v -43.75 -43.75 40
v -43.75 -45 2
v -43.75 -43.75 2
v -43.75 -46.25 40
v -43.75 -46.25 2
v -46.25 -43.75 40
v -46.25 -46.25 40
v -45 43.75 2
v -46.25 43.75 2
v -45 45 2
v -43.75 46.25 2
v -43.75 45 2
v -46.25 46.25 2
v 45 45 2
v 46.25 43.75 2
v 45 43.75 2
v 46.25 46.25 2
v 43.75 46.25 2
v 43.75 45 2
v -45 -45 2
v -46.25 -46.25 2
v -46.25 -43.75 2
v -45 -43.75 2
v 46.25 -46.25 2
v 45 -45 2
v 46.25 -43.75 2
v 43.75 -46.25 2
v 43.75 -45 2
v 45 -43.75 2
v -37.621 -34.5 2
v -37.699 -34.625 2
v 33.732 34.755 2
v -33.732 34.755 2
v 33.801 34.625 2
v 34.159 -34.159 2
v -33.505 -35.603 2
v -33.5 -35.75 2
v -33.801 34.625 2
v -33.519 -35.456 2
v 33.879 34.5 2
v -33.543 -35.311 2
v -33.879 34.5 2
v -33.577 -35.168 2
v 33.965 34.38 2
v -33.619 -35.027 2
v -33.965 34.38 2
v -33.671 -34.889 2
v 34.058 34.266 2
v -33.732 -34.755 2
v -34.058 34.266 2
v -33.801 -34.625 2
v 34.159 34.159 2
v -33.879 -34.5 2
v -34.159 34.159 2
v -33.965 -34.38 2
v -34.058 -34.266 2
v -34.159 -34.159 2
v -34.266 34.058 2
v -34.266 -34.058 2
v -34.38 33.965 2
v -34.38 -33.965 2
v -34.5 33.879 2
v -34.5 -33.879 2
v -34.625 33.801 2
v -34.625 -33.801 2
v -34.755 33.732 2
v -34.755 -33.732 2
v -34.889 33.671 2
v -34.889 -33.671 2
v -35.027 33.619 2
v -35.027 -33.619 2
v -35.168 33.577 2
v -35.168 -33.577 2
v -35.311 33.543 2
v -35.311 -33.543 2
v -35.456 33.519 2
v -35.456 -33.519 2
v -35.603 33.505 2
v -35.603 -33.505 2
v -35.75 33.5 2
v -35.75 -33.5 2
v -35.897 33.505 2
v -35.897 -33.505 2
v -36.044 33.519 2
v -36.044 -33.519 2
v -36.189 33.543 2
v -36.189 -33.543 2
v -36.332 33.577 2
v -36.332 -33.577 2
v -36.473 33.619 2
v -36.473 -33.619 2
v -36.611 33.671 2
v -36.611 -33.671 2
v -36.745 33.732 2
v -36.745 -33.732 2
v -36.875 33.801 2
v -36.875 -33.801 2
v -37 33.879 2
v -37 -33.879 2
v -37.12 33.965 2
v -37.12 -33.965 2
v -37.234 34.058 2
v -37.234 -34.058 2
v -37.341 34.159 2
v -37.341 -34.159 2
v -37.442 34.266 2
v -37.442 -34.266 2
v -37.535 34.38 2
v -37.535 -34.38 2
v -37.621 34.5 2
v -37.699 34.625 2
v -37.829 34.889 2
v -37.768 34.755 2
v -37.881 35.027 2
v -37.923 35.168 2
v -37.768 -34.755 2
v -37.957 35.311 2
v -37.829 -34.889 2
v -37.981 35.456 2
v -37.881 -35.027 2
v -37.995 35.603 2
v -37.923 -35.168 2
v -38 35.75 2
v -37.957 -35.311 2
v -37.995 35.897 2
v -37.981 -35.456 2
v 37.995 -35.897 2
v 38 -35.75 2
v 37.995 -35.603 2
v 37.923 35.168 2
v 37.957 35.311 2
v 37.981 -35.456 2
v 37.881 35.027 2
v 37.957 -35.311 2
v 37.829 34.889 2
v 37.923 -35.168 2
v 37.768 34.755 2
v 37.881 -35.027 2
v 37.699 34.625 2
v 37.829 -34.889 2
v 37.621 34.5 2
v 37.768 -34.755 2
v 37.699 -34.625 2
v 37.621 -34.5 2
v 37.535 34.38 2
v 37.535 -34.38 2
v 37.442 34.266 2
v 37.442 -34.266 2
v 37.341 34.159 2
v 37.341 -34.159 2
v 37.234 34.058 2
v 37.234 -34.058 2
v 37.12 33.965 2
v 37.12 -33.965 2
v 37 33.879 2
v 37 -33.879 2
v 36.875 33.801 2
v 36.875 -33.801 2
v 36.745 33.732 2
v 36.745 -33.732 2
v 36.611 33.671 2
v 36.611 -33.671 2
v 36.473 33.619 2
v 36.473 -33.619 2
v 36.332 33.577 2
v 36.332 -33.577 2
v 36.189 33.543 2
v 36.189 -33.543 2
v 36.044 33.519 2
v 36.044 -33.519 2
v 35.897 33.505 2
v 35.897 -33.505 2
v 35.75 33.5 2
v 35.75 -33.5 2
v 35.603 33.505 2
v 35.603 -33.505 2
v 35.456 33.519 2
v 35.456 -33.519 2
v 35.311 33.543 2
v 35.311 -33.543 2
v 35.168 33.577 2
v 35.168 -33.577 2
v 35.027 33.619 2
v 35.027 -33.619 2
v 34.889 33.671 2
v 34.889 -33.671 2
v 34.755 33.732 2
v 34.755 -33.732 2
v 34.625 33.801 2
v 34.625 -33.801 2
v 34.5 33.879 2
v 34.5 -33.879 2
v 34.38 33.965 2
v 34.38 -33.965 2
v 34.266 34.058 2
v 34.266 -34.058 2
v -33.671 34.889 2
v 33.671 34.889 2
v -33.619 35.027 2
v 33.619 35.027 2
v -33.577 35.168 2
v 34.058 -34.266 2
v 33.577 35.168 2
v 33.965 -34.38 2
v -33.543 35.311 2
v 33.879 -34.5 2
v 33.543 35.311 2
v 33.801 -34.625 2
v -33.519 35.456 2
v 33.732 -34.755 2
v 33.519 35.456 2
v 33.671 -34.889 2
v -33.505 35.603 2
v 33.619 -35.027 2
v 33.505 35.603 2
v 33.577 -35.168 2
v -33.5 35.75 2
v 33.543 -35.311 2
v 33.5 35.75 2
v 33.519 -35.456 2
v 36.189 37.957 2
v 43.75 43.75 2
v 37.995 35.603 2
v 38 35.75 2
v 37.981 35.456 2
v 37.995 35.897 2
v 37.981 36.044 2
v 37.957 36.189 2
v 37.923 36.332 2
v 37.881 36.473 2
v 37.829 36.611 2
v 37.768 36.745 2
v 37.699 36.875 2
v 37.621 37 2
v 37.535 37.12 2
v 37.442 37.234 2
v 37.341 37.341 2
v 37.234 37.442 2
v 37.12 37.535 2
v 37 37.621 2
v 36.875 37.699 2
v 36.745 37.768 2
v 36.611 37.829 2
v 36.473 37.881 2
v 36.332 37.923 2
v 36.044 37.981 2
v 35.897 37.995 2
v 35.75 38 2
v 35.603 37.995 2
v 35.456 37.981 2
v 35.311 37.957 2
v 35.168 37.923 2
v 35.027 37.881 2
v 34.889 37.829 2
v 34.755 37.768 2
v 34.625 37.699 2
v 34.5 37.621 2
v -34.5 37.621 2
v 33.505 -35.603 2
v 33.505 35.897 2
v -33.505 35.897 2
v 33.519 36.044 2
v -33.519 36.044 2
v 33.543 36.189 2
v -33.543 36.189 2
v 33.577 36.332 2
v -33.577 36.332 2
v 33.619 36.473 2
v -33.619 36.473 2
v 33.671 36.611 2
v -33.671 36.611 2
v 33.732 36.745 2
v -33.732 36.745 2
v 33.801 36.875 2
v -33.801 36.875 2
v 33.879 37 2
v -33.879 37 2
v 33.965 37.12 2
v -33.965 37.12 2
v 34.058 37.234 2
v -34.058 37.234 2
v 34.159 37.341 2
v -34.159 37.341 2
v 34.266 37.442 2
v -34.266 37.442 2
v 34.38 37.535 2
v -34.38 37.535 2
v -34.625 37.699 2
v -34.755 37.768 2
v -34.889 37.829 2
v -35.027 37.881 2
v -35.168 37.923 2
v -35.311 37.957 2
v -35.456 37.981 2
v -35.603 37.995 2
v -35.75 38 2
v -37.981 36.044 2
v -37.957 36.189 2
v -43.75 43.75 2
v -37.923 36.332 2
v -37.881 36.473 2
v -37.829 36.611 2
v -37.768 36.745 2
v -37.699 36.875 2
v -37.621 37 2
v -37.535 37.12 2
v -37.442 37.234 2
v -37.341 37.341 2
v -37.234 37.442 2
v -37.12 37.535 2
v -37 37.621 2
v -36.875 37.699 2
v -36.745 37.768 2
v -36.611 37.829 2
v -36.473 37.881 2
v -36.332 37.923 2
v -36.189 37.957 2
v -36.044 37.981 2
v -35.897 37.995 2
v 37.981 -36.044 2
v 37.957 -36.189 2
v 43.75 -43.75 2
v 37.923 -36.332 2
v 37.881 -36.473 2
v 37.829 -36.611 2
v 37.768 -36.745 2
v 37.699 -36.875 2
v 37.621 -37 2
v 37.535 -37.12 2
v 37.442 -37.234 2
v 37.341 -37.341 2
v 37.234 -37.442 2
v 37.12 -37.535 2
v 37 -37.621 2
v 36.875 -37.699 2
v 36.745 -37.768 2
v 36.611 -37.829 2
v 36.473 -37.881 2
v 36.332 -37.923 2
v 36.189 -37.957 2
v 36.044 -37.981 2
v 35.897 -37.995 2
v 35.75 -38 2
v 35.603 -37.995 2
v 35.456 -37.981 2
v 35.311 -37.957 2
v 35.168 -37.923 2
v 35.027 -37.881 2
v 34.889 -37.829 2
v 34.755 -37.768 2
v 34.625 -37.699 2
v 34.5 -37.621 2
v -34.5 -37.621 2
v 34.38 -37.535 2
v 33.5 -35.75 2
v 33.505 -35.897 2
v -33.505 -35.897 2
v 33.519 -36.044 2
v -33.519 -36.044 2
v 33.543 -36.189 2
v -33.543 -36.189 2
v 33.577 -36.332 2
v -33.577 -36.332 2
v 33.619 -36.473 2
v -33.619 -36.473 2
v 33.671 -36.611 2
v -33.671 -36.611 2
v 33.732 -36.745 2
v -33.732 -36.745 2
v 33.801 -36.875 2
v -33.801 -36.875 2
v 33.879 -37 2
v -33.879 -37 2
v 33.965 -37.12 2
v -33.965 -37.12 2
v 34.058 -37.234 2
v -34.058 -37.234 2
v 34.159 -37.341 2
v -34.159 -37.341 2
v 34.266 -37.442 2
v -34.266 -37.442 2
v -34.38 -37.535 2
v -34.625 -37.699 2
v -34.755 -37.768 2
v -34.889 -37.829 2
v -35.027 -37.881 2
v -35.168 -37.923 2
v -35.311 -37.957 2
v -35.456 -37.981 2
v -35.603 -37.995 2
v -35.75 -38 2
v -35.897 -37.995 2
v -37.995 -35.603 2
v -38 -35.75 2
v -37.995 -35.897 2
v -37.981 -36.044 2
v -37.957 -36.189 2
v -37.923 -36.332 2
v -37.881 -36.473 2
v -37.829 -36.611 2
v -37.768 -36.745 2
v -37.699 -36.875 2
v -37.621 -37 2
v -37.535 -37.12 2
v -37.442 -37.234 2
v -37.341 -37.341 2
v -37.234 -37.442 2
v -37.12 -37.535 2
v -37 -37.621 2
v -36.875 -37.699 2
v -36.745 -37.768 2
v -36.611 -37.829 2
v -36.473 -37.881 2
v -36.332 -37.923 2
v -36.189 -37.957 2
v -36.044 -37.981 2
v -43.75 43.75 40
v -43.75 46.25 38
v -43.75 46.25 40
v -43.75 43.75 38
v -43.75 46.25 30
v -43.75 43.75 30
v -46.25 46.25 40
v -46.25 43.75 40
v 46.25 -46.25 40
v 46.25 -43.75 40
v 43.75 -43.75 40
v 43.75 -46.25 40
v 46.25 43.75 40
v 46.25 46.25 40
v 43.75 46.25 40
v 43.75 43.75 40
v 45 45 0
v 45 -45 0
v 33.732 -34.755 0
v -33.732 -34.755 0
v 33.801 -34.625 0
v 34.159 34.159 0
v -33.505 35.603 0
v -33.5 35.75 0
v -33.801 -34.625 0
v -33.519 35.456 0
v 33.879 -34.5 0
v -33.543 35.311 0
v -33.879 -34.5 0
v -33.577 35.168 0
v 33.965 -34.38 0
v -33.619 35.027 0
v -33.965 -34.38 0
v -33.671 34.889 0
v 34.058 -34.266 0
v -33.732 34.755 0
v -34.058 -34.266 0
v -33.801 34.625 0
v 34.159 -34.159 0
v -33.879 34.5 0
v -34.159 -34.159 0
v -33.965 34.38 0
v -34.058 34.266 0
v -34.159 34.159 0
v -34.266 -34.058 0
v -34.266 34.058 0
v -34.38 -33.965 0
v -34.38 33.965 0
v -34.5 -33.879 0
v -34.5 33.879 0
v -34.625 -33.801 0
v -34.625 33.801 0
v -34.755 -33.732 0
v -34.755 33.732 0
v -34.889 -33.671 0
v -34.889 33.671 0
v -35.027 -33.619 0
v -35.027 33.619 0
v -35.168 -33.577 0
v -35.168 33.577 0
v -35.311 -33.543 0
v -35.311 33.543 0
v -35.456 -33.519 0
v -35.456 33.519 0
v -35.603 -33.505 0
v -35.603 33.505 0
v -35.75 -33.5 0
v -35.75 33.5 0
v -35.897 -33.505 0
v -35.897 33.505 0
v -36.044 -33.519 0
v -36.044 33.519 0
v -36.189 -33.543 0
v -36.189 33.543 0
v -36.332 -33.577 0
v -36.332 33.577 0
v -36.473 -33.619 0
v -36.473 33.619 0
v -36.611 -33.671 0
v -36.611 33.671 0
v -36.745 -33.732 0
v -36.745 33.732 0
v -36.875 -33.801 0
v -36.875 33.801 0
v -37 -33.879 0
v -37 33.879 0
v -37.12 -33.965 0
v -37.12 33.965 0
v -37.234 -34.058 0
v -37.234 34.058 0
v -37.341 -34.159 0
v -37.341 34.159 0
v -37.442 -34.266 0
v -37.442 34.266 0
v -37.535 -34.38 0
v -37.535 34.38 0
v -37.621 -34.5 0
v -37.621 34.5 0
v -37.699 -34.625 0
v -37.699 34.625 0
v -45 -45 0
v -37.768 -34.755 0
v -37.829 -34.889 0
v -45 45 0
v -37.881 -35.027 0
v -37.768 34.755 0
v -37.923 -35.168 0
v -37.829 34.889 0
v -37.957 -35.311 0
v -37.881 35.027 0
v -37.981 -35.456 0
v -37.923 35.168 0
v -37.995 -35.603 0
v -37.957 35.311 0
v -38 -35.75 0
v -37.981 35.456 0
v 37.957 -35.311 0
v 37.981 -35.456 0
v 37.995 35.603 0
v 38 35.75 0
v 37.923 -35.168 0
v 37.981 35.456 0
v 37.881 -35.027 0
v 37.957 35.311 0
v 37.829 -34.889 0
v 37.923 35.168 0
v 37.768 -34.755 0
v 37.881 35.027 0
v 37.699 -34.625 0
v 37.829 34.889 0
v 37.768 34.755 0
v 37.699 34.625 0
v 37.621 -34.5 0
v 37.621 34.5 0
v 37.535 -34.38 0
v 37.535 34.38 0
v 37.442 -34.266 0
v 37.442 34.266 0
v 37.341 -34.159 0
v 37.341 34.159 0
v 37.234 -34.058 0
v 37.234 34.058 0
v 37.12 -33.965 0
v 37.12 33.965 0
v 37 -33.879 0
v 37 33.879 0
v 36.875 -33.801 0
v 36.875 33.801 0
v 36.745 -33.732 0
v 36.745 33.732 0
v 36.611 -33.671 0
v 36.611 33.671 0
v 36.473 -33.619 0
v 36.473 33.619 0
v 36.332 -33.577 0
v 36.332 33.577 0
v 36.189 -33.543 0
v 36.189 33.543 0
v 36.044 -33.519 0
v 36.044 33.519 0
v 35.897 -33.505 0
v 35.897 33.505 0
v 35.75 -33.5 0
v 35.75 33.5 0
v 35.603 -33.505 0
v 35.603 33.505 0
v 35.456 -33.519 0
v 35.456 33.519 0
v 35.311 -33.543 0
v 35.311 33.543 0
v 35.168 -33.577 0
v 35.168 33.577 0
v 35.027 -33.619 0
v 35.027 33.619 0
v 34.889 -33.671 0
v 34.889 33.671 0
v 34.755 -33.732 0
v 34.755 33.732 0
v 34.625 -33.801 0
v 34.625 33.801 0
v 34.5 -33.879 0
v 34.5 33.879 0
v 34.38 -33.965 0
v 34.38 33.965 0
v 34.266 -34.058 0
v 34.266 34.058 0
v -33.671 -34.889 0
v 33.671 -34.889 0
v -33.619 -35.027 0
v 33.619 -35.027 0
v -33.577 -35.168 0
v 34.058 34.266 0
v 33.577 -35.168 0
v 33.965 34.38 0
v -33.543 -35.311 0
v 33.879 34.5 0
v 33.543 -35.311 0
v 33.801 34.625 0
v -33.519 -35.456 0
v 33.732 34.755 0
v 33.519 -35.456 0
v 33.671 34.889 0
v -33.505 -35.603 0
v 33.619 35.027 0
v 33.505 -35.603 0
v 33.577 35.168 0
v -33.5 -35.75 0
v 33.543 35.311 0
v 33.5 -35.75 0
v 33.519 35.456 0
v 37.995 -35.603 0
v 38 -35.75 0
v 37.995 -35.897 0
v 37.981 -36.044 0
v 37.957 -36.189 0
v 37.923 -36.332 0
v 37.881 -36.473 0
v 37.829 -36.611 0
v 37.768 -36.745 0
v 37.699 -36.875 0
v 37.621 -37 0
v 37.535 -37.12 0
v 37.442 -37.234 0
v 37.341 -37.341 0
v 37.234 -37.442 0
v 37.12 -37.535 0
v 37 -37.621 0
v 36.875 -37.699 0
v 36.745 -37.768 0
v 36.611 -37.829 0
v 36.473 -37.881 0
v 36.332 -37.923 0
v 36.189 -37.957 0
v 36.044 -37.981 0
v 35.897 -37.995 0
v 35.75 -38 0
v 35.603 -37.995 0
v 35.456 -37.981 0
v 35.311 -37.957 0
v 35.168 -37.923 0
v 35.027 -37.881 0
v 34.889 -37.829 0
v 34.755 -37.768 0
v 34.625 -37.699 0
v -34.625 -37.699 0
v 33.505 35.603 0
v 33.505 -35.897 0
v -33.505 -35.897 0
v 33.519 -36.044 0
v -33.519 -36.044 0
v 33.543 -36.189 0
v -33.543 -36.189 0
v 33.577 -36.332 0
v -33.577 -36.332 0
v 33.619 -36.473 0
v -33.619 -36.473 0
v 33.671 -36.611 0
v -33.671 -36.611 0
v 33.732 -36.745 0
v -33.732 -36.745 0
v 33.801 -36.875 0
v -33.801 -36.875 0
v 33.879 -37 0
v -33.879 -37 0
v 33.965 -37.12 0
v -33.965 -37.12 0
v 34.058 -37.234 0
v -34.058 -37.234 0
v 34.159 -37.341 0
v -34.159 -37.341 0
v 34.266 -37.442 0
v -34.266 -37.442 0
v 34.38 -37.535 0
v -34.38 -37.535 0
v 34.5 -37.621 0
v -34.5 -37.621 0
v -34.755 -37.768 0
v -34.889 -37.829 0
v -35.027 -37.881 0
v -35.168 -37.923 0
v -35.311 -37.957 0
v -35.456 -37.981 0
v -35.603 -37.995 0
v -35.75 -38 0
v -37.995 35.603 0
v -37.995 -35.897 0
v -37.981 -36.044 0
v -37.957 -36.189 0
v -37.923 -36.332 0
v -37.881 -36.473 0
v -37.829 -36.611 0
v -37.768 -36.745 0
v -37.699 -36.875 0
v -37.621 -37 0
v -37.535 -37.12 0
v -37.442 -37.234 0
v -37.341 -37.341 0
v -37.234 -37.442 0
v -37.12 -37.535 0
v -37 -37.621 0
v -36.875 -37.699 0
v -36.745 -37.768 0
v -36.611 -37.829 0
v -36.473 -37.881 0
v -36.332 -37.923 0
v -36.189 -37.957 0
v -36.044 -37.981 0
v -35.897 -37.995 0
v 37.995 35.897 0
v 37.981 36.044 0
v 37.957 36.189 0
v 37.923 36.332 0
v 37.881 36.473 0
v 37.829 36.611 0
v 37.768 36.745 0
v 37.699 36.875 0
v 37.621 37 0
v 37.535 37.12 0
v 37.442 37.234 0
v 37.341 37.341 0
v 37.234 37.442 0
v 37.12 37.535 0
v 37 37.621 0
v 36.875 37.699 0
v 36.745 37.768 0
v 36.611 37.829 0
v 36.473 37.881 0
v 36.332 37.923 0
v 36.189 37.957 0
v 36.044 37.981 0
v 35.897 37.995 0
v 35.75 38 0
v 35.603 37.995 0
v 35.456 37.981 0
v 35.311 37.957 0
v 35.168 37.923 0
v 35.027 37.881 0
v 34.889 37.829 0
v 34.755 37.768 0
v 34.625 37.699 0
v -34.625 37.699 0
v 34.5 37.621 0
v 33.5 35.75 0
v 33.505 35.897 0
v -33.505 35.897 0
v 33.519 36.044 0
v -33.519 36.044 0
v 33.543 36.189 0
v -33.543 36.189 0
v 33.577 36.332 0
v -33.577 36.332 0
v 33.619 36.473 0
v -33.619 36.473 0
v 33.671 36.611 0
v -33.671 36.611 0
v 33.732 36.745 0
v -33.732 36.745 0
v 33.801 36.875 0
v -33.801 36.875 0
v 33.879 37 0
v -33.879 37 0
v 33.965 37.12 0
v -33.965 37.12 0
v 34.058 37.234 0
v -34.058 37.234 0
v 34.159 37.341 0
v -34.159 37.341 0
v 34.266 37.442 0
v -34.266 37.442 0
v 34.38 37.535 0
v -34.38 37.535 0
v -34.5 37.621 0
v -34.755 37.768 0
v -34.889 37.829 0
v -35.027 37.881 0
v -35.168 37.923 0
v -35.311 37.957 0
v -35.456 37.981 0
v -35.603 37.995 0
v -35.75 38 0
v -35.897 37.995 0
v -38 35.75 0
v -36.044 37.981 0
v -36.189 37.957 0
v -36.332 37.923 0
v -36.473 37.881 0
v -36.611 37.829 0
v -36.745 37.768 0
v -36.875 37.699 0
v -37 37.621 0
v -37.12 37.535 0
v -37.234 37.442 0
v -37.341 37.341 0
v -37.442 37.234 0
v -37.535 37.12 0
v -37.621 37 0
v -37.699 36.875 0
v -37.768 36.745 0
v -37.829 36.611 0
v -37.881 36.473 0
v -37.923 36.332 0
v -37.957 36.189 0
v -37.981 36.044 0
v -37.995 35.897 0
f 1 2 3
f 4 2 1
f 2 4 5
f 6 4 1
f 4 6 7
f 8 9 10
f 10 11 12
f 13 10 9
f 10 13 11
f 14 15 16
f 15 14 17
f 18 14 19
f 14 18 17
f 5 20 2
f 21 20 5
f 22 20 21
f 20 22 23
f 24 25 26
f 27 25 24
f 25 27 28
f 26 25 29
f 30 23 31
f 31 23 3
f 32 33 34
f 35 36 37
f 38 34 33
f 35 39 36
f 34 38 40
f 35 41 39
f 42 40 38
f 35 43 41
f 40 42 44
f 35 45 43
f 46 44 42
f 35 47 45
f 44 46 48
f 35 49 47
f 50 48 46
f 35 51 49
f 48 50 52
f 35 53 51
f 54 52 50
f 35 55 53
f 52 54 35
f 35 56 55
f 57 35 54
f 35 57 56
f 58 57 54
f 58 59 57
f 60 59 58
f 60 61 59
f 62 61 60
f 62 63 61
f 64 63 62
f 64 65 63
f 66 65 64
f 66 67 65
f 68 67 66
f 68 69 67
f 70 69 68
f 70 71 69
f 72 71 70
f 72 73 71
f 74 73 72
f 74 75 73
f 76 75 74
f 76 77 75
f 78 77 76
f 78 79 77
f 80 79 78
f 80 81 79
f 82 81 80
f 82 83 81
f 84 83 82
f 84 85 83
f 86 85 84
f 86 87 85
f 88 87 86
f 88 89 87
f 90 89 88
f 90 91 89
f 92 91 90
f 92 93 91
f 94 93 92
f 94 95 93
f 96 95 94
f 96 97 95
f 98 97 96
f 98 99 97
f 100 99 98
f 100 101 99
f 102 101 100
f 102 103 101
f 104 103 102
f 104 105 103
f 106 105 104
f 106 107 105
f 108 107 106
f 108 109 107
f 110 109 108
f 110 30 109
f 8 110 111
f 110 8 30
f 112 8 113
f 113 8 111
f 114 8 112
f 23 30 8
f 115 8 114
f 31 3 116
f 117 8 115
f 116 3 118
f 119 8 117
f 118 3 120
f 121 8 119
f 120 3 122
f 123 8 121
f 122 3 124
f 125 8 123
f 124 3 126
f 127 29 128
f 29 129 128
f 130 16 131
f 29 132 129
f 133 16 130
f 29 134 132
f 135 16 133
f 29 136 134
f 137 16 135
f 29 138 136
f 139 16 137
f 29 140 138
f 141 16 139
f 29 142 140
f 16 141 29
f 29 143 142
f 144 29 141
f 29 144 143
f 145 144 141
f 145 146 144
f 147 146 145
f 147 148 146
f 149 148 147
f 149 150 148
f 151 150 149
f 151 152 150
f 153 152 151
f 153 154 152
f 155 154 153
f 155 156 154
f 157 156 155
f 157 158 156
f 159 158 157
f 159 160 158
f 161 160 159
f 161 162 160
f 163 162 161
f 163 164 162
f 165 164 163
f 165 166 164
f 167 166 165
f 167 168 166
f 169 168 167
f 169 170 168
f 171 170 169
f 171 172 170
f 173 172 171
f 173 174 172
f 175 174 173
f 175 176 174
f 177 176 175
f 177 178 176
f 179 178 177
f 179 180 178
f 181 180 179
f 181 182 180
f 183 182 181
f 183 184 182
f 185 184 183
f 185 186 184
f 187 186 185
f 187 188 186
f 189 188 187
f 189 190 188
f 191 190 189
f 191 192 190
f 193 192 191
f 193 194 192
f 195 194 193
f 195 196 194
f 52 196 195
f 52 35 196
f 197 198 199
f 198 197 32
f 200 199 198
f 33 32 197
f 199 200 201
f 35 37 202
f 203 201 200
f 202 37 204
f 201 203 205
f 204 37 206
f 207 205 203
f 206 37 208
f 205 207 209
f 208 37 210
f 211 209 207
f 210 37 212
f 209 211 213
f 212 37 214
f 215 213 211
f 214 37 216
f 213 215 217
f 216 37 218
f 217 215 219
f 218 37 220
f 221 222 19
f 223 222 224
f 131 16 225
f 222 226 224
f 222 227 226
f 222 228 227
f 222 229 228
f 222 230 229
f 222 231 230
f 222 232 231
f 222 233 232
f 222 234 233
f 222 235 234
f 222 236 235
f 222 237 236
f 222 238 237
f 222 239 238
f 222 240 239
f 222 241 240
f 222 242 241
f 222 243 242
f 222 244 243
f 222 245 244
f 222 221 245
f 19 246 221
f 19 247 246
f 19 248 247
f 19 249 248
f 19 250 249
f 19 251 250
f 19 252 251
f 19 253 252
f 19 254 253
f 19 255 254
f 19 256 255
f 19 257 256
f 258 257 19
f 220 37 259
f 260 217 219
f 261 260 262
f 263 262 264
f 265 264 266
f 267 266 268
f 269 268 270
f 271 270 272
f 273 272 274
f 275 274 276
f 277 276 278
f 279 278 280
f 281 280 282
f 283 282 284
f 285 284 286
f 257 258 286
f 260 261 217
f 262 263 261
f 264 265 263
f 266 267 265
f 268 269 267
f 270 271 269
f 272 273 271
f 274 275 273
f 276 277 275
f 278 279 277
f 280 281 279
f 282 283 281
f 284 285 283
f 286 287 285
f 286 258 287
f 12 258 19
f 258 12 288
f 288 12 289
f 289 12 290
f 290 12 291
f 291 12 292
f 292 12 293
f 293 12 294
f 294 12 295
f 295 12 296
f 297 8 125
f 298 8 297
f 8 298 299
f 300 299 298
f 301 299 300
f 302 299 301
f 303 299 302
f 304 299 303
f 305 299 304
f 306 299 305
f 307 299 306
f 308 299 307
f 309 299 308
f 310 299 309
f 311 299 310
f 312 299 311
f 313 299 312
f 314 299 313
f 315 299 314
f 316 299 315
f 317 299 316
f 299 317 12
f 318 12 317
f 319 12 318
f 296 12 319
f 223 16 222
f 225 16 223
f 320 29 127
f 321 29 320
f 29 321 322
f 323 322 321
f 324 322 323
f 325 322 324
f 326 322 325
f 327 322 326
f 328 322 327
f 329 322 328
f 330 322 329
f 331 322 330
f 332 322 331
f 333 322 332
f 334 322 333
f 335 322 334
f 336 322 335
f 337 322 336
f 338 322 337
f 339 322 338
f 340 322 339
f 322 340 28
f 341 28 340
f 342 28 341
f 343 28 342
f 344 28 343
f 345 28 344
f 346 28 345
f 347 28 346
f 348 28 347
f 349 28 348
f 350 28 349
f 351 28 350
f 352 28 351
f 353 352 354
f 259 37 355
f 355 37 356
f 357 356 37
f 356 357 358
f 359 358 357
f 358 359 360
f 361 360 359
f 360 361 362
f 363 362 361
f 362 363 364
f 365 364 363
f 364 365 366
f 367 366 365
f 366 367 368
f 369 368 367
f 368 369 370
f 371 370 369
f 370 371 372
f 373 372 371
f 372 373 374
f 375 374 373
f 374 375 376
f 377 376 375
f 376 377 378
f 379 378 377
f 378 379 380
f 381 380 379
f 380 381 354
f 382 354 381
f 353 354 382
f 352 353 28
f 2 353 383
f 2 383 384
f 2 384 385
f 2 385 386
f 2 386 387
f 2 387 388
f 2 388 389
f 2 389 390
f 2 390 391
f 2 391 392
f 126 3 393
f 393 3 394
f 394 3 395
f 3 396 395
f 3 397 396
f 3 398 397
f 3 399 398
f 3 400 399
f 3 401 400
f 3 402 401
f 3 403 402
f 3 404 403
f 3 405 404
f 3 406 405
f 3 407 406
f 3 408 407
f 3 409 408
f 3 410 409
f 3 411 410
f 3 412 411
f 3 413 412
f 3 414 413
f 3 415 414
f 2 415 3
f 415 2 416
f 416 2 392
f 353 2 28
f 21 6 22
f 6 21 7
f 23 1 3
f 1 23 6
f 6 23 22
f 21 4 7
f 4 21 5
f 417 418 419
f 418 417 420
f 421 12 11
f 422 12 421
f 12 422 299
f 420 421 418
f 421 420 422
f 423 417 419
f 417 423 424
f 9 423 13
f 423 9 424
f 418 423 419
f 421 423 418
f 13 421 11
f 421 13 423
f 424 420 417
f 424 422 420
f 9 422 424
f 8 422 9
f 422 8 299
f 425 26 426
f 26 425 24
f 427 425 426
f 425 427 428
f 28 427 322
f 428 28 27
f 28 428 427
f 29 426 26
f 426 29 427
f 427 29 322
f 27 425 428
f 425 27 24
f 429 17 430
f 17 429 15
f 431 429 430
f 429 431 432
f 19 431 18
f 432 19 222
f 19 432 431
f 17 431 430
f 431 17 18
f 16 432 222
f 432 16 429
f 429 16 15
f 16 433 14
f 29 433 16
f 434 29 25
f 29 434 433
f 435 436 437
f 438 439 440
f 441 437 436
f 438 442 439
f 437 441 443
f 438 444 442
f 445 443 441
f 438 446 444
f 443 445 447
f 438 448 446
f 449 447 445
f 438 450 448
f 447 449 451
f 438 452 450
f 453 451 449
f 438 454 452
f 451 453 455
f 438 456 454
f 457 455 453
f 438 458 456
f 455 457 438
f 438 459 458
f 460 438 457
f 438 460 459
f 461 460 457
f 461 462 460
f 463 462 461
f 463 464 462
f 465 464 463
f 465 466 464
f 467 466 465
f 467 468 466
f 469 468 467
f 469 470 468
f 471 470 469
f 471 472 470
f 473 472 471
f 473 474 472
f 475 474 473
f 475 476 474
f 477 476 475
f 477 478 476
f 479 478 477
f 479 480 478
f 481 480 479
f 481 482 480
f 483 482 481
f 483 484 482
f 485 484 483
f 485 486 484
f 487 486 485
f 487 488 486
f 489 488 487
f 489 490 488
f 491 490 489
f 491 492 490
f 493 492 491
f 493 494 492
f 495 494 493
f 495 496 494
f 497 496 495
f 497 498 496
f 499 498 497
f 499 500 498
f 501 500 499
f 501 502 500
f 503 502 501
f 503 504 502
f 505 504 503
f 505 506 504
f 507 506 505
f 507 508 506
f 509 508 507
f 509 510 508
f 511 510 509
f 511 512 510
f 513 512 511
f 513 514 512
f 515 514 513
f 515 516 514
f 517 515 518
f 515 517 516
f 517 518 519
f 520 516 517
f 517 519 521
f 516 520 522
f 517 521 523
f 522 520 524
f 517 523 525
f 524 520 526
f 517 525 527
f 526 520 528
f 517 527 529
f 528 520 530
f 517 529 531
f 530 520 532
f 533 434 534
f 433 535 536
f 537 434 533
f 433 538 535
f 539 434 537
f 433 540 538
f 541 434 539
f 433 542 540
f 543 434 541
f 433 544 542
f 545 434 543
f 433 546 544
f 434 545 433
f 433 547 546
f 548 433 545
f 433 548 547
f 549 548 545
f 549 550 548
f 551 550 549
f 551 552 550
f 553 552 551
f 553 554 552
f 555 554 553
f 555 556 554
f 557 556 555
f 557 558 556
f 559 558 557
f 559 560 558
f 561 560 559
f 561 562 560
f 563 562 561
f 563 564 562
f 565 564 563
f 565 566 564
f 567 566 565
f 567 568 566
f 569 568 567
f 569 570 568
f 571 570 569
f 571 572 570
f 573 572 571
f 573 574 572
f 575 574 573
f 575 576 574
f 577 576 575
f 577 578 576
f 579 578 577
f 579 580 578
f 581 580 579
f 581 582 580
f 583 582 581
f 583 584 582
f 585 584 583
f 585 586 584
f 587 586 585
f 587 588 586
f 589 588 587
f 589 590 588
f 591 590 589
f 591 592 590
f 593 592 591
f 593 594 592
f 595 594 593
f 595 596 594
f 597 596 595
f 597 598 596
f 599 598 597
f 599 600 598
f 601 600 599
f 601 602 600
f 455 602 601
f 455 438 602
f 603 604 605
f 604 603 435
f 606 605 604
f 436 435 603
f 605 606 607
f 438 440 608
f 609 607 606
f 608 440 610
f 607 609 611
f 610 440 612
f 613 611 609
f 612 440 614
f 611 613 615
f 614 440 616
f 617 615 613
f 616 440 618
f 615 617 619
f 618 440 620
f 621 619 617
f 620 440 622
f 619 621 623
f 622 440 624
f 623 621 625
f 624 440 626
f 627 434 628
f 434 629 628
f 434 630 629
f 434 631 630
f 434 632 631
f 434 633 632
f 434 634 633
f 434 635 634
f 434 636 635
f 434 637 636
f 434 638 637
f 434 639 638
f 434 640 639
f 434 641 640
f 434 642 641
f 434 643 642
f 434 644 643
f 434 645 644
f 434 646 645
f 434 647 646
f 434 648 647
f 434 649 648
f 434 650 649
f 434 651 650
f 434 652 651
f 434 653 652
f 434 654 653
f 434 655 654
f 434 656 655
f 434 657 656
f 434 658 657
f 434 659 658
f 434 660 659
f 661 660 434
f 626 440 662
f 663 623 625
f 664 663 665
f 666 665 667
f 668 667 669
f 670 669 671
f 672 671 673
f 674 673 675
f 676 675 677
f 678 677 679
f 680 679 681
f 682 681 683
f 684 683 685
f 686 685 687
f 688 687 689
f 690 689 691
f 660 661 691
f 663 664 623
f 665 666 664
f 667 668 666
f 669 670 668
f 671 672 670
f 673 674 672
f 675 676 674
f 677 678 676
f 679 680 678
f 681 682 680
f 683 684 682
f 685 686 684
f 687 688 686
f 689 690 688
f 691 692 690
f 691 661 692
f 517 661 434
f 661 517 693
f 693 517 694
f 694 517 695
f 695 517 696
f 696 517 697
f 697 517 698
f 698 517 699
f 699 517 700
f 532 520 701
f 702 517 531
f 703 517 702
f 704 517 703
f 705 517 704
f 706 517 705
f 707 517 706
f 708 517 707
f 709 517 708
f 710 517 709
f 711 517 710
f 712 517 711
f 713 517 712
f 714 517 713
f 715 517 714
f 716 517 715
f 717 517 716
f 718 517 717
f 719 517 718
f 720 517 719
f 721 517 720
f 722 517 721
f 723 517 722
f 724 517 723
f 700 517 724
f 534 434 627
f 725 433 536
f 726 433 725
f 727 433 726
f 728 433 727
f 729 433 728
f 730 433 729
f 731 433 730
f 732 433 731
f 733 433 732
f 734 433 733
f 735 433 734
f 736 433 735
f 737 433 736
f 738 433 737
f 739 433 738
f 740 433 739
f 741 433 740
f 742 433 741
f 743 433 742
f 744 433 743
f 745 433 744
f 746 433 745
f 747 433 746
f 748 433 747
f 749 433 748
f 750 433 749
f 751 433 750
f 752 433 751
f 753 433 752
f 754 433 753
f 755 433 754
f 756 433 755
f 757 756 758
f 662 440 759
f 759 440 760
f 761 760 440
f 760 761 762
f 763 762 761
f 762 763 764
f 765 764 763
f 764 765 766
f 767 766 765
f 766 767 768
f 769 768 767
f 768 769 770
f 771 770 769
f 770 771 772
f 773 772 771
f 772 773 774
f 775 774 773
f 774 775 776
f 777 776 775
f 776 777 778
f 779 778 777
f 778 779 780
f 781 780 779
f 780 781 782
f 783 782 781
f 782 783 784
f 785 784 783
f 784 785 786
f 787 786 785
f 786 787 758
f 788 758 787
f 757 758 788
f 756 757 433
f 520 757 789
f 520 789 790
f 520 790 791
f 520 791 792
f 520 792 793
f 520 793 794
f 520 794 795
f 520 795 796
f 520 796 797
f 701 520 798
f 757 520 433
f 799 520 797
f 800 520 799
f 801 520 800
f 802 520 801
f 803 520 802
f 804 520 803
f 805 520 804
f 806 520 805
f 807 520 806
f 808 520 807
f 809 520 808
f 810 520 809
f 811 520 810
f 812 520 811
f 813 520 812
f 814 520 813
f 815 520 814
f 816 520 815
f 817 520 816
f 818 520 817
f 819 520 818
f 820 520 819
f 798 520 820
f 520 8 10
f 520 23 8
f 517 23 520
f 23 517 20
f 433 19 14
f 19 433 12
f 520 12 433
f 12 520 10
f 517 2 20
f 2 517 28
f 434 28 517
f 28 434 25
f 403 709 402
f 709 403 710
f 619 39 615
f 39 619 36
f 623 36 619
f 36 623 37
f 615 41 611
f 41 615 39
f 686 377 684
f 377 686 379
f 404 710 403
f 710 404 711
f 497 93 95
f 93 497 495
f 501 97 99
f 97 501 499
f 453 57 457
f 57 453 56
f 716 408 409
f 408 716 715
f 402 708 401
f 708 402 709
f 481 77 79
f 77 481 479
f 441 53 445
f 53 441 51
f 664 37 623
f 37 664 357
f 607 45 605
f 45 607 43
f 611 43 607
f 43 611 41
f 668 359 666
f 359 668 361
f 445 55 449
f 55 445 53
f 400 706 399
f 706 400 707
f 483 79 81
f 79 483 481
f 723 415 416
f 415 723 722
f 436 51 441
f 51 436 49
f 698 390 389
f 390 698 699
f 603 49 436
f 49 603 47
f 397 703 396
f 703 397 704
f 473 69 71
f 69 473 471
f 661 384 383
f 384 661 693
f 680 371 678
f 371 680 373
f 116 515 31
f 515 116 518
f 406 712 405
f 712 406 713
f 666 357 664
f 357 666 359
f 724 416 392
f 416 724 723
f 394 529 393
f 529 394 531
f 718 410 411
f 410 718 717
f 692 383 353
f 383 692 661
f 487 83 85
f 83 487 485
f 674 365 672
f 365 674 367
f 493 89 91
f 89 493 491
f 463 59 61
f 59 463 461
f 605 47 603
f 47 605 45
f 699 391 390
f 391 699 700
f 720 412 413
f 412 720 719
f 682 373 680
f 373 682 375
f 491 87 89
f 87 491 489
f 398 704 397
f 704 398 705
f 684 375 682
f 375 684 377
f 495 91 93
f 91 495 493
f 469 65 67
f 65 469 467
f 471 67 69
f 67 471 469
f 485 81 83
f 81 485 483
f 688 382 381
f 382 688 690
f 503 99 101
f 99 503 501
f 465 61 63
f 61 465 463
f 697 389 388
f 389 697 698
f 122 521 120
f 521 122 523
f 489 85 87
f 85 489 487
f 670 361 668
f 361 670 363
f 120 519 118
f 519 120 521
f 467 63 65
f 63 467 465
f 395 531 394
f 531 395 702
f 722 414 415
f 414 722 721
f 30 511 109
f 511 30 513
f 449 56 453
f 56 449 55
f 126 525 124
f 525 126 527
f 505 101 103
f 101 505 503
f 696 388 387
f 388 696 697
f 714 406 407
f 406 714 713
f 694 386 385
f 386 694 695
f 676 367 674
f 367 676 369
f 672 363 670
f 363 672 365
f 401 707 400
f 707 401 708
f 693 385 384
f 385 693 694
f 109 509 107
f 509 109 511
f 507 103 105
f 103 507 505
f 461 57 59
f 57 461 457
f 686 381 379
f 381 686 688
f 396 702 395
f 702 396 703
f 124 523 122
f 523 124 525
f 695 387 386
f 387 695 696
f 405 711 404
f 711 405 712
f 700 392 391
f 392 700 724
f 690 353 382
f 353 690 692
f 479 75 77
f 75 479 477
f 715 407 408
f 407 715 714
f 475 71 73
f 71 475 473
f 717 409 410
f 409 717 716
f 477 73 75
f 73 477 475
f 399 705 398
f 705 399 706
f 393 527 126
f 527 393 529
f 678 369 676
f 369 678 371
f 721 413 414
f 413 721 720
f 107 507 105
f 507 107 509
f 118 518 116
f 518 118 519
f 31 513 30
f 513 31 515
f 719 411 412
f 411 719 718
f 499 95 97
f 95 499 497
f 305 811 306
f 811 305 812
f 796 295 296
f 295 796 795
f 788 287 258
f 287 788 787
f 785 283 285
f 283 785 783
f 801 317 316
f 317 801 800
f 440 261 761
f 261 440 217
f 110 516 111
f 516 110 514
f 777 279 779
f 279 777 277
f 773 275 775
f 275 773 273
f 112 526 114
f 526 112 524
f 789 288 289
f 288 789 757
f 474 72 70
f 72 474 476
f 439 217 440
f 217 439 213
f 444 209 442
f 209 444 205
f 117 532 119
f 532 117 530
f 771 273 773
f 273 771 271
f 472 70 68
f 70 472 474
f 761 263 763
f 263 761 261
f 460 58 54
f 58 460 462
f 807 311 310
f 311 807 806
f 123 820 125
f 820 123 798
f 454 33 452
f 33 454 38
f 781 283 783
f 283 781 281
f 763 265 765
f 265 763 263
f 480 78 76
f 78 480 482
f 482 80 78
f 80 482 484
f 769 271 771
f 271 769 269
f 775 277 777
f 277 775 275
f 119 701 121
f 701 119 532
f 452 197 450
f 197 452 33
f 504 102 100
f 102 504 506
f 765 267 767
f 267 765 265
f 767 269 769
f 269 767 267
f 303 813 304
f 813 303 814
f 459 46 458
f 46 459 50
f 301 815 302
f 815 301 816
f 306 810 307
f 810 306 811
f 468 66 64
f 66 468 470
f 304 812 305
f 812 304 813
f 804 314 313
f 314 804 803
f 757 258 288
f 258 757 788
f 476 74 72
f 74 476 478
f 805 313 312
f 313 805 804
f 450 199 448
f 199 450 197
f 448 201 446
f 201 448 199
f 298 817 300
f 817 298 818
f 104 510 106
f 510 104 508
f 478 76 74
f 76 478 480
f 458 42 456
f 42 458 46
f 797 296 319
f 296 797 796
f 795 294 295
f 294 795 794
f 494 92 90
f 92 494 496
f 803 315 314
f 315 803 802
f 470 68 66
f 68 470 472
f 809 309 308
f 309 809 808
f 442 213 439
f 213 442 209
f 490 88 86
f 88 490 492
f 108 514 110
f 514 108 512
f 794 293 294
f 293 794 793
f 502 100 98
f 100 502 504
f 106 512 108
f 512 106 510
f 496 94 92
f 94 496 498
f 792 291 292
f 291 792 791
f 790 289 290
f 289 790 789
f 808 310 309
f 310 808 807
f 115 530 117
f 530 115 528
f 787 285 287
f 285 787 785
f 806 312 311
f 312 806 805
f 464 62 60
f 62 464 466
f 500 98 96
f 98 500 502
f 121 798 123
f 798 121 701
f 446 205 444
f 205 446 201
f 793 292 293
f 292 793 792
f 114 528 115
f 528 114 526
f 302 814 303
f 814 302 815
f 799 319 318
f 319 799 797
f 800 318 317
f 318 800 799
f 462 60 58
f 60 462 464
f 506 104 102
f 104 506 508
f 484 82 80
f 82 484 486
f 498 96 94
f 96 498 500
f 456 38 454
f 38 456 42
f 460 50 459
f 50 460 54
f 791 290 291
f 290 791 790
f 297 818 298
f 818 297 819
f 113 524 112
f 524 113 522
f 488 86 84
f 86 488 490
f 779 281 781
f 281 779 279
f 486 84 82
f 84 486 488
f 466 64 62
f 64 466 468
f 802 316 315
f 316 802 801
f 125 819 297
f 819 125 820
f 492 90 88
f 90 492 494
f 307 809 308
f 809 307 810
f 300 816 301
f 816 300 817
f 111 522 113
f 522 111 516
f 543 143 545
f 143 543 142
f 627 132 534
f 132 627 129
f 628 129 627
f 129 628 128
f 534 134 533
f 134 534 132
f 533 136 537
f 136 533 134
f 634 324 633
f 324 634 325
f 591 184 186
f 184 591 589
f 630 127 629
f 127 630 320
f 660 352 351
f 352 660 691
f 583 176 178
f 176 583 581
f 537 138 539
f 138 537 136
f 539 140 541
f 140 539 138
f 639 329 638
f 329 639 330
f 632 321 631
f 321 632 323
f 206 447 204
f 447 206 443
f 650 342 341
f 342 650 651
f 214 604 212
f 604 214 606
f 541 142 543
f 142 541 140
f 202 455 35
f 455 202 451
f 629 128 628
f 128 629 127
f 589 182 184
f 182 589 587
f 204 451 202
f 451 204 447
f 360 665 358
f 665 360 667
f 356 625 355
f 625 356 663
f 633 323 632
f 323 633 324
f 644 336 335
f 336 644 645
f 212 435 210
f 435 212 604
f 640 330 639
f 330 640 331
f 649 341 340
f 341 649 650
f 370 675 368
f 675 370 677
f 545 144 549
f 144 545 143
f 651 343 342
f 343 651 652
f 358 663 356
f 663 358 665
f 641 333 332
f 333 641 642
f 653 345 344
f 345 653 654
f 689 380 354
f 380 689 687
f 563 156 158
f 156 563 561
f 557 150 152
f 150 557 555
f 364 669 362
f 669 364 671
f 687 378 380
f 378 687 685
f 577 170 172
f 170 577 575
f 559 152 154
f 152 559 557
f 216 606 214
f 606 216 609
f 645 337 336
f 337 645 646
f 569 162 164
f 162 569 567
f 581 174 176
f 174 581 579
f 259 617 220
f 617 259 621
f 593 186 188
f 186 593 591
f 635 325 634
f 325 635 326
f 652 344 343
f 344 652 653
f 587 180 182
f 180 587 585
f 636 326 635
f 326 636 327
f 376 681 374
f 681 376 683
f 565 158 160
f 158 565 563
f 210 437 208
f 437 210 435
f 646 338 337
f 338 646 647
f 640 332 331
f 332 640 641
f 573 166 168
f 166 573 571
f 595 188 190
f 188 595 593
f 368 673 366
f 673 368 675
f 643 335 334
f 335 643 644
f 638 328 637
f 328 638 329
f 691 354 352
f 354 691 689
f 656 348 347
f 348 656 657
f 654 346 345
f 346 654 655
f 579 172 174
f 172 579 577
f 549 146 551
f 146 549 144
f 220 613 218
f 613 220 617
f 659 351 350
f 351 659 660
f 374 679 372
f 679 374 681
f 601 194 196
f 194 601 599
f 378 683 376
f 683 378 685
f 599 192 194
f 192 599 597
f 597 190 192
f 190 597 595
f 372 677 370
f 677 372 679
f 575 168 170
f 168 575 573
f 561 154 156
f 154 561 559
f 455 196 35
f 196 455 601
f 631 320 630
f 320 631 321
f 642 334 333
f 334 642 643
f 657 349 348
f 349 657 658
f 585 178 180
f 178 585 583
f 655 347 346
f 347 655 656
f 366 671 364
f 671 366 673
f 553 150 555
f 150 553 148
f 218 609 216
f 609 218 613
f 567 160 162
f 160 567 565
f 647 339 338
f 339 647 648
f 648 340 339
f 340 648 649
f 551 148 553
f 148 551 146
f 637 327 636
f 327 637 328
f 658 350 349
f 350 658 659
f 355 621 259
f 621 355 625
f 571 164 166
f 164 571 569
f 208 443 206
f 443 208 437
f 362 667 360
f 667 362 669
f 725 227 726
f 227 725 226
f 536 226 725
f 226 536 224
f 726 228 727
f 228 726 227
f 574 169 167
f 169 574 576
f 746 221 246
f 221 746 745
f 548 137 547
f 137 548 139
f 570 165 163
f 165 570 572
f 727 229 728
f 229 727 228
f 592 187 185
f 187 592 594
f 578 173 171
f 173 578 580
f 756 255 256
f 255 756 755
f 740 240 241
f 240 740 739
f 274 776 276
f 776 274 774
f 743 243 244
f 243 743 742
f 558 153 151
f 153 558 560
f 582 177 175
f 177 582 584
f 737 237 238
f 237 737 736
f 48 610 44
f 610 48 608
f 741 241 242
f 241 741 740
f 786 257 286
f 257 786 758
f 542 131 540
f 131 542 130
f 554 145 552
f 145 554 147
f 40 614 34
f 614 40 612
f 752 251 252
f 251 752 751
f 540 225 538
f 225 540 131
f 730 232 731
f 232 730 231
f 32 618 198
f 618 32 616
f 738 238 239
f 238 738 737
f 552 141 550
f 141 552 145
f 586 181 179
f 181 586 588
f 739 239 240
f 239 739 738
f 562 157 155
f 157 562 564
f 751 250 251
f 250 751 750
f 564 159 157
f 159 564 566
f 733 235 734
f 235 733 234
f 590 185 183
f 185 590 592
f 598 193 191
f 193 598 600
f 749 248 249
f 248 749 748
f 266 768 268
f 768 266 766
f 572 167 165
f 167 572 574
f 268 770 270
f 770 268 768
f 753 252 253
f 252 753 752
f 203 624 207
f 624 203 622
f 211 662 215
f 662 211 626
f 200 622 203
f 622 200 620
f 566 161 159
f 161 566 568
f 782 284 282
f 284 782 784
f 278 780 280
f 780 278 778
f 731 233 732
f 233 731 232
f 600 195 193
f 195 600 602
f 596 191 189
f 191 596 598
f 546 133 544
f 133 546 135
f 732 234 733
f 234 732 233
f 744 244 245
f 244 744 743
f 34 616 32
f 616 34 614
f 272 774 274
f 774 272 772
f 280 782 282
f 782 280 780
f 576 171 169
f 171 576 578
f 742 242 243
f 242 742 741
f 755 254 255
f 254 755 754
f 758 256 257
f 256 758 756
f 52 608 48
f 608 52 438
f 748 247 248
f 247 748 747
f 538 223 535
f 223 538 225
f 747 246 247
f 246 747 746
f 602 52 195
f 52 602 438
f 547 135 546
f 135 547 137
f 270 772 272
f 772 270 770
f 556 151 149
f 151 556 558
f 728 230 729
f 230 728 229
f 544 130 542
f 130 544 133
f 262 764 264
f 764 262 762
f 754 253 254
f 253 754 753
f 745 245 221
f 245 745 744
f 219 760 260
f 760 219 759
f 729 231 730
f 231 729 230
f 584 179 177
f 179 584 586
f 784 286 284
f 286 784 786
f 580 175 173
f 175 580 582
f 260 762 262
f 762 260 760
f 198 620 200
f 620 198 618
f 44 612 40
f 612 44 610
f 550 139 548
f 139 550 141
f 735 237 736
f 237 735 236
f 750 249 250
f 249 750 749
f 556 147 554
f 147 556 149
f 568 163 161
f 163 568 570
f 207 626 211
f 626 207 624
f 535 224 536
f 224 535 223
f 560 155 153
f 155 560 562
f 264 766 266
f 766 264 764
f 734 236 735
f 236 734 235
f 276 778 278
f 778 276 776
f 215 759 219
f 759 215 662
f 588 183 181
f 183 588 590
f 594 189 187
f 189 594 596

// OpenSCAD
// DIY magnetic stirrer housing - print orientation (upside down)
// Units: mm

// ---------- Parameters ----------
top_thickness      = 2;     // top plate thickness (z = 0 to 2)
wall_thickness     = 2.5;   // wall thickness
box_height         = 40;    // total height of box (open at top)
outer_size         = 90;    // outer length and width (X and Y)
screw_hole_d       = 4.5;   // M4 screw hole diameter
screw_hole_pitch   = 71.5;  // square pattern diagonal (centre to centre)
cable_notch_w      = 12;    // cable notch width
cable_notch_depth  = 8;     // cable notch depth from open edge (z = 32 to 40)
eps                = 0.5;   // cutter overshoot past faces

$fn = 96;

// ---------- Model ----------
difference() {
    union() {
        // Top plate (lies on bed)
        translate([-outer_size/2, -outer_size/2, 0])
            cube([outer_size, outer_size, top_thickness]);

        // Four walls rising from plate
        for (x = [-outer_size/2, outer_size/2])
            for (y = [-outer_size/2, outer_size/2])
                translate([x - wall_thickness/2, y - wall_thickness/2, top_thickness])
                    cube([wall_thickness, wall_thickness, box_height - top_thickness]);
    }

    // Four M4 screw holes through top plate, centred square pattern
    for (x = [-screw_hole_pitch/2, screw_hole_pitch/2])
        for (y = [-screw_hole_pitch/2, screw_hole_pitch/2])
            translate([x, y, -eps])
                cylinder(d = screw_hole_d, h = top_thickness + 2*eps);

    // Cable notch in one wall, centred along the wall
    translate([-outer_size/2 + wall_thickness/2, 0, box_height - top_thickness - cable_notch_depth])
        cube([cable_notch_w, outer_size, cable_notch_depth]);
}
